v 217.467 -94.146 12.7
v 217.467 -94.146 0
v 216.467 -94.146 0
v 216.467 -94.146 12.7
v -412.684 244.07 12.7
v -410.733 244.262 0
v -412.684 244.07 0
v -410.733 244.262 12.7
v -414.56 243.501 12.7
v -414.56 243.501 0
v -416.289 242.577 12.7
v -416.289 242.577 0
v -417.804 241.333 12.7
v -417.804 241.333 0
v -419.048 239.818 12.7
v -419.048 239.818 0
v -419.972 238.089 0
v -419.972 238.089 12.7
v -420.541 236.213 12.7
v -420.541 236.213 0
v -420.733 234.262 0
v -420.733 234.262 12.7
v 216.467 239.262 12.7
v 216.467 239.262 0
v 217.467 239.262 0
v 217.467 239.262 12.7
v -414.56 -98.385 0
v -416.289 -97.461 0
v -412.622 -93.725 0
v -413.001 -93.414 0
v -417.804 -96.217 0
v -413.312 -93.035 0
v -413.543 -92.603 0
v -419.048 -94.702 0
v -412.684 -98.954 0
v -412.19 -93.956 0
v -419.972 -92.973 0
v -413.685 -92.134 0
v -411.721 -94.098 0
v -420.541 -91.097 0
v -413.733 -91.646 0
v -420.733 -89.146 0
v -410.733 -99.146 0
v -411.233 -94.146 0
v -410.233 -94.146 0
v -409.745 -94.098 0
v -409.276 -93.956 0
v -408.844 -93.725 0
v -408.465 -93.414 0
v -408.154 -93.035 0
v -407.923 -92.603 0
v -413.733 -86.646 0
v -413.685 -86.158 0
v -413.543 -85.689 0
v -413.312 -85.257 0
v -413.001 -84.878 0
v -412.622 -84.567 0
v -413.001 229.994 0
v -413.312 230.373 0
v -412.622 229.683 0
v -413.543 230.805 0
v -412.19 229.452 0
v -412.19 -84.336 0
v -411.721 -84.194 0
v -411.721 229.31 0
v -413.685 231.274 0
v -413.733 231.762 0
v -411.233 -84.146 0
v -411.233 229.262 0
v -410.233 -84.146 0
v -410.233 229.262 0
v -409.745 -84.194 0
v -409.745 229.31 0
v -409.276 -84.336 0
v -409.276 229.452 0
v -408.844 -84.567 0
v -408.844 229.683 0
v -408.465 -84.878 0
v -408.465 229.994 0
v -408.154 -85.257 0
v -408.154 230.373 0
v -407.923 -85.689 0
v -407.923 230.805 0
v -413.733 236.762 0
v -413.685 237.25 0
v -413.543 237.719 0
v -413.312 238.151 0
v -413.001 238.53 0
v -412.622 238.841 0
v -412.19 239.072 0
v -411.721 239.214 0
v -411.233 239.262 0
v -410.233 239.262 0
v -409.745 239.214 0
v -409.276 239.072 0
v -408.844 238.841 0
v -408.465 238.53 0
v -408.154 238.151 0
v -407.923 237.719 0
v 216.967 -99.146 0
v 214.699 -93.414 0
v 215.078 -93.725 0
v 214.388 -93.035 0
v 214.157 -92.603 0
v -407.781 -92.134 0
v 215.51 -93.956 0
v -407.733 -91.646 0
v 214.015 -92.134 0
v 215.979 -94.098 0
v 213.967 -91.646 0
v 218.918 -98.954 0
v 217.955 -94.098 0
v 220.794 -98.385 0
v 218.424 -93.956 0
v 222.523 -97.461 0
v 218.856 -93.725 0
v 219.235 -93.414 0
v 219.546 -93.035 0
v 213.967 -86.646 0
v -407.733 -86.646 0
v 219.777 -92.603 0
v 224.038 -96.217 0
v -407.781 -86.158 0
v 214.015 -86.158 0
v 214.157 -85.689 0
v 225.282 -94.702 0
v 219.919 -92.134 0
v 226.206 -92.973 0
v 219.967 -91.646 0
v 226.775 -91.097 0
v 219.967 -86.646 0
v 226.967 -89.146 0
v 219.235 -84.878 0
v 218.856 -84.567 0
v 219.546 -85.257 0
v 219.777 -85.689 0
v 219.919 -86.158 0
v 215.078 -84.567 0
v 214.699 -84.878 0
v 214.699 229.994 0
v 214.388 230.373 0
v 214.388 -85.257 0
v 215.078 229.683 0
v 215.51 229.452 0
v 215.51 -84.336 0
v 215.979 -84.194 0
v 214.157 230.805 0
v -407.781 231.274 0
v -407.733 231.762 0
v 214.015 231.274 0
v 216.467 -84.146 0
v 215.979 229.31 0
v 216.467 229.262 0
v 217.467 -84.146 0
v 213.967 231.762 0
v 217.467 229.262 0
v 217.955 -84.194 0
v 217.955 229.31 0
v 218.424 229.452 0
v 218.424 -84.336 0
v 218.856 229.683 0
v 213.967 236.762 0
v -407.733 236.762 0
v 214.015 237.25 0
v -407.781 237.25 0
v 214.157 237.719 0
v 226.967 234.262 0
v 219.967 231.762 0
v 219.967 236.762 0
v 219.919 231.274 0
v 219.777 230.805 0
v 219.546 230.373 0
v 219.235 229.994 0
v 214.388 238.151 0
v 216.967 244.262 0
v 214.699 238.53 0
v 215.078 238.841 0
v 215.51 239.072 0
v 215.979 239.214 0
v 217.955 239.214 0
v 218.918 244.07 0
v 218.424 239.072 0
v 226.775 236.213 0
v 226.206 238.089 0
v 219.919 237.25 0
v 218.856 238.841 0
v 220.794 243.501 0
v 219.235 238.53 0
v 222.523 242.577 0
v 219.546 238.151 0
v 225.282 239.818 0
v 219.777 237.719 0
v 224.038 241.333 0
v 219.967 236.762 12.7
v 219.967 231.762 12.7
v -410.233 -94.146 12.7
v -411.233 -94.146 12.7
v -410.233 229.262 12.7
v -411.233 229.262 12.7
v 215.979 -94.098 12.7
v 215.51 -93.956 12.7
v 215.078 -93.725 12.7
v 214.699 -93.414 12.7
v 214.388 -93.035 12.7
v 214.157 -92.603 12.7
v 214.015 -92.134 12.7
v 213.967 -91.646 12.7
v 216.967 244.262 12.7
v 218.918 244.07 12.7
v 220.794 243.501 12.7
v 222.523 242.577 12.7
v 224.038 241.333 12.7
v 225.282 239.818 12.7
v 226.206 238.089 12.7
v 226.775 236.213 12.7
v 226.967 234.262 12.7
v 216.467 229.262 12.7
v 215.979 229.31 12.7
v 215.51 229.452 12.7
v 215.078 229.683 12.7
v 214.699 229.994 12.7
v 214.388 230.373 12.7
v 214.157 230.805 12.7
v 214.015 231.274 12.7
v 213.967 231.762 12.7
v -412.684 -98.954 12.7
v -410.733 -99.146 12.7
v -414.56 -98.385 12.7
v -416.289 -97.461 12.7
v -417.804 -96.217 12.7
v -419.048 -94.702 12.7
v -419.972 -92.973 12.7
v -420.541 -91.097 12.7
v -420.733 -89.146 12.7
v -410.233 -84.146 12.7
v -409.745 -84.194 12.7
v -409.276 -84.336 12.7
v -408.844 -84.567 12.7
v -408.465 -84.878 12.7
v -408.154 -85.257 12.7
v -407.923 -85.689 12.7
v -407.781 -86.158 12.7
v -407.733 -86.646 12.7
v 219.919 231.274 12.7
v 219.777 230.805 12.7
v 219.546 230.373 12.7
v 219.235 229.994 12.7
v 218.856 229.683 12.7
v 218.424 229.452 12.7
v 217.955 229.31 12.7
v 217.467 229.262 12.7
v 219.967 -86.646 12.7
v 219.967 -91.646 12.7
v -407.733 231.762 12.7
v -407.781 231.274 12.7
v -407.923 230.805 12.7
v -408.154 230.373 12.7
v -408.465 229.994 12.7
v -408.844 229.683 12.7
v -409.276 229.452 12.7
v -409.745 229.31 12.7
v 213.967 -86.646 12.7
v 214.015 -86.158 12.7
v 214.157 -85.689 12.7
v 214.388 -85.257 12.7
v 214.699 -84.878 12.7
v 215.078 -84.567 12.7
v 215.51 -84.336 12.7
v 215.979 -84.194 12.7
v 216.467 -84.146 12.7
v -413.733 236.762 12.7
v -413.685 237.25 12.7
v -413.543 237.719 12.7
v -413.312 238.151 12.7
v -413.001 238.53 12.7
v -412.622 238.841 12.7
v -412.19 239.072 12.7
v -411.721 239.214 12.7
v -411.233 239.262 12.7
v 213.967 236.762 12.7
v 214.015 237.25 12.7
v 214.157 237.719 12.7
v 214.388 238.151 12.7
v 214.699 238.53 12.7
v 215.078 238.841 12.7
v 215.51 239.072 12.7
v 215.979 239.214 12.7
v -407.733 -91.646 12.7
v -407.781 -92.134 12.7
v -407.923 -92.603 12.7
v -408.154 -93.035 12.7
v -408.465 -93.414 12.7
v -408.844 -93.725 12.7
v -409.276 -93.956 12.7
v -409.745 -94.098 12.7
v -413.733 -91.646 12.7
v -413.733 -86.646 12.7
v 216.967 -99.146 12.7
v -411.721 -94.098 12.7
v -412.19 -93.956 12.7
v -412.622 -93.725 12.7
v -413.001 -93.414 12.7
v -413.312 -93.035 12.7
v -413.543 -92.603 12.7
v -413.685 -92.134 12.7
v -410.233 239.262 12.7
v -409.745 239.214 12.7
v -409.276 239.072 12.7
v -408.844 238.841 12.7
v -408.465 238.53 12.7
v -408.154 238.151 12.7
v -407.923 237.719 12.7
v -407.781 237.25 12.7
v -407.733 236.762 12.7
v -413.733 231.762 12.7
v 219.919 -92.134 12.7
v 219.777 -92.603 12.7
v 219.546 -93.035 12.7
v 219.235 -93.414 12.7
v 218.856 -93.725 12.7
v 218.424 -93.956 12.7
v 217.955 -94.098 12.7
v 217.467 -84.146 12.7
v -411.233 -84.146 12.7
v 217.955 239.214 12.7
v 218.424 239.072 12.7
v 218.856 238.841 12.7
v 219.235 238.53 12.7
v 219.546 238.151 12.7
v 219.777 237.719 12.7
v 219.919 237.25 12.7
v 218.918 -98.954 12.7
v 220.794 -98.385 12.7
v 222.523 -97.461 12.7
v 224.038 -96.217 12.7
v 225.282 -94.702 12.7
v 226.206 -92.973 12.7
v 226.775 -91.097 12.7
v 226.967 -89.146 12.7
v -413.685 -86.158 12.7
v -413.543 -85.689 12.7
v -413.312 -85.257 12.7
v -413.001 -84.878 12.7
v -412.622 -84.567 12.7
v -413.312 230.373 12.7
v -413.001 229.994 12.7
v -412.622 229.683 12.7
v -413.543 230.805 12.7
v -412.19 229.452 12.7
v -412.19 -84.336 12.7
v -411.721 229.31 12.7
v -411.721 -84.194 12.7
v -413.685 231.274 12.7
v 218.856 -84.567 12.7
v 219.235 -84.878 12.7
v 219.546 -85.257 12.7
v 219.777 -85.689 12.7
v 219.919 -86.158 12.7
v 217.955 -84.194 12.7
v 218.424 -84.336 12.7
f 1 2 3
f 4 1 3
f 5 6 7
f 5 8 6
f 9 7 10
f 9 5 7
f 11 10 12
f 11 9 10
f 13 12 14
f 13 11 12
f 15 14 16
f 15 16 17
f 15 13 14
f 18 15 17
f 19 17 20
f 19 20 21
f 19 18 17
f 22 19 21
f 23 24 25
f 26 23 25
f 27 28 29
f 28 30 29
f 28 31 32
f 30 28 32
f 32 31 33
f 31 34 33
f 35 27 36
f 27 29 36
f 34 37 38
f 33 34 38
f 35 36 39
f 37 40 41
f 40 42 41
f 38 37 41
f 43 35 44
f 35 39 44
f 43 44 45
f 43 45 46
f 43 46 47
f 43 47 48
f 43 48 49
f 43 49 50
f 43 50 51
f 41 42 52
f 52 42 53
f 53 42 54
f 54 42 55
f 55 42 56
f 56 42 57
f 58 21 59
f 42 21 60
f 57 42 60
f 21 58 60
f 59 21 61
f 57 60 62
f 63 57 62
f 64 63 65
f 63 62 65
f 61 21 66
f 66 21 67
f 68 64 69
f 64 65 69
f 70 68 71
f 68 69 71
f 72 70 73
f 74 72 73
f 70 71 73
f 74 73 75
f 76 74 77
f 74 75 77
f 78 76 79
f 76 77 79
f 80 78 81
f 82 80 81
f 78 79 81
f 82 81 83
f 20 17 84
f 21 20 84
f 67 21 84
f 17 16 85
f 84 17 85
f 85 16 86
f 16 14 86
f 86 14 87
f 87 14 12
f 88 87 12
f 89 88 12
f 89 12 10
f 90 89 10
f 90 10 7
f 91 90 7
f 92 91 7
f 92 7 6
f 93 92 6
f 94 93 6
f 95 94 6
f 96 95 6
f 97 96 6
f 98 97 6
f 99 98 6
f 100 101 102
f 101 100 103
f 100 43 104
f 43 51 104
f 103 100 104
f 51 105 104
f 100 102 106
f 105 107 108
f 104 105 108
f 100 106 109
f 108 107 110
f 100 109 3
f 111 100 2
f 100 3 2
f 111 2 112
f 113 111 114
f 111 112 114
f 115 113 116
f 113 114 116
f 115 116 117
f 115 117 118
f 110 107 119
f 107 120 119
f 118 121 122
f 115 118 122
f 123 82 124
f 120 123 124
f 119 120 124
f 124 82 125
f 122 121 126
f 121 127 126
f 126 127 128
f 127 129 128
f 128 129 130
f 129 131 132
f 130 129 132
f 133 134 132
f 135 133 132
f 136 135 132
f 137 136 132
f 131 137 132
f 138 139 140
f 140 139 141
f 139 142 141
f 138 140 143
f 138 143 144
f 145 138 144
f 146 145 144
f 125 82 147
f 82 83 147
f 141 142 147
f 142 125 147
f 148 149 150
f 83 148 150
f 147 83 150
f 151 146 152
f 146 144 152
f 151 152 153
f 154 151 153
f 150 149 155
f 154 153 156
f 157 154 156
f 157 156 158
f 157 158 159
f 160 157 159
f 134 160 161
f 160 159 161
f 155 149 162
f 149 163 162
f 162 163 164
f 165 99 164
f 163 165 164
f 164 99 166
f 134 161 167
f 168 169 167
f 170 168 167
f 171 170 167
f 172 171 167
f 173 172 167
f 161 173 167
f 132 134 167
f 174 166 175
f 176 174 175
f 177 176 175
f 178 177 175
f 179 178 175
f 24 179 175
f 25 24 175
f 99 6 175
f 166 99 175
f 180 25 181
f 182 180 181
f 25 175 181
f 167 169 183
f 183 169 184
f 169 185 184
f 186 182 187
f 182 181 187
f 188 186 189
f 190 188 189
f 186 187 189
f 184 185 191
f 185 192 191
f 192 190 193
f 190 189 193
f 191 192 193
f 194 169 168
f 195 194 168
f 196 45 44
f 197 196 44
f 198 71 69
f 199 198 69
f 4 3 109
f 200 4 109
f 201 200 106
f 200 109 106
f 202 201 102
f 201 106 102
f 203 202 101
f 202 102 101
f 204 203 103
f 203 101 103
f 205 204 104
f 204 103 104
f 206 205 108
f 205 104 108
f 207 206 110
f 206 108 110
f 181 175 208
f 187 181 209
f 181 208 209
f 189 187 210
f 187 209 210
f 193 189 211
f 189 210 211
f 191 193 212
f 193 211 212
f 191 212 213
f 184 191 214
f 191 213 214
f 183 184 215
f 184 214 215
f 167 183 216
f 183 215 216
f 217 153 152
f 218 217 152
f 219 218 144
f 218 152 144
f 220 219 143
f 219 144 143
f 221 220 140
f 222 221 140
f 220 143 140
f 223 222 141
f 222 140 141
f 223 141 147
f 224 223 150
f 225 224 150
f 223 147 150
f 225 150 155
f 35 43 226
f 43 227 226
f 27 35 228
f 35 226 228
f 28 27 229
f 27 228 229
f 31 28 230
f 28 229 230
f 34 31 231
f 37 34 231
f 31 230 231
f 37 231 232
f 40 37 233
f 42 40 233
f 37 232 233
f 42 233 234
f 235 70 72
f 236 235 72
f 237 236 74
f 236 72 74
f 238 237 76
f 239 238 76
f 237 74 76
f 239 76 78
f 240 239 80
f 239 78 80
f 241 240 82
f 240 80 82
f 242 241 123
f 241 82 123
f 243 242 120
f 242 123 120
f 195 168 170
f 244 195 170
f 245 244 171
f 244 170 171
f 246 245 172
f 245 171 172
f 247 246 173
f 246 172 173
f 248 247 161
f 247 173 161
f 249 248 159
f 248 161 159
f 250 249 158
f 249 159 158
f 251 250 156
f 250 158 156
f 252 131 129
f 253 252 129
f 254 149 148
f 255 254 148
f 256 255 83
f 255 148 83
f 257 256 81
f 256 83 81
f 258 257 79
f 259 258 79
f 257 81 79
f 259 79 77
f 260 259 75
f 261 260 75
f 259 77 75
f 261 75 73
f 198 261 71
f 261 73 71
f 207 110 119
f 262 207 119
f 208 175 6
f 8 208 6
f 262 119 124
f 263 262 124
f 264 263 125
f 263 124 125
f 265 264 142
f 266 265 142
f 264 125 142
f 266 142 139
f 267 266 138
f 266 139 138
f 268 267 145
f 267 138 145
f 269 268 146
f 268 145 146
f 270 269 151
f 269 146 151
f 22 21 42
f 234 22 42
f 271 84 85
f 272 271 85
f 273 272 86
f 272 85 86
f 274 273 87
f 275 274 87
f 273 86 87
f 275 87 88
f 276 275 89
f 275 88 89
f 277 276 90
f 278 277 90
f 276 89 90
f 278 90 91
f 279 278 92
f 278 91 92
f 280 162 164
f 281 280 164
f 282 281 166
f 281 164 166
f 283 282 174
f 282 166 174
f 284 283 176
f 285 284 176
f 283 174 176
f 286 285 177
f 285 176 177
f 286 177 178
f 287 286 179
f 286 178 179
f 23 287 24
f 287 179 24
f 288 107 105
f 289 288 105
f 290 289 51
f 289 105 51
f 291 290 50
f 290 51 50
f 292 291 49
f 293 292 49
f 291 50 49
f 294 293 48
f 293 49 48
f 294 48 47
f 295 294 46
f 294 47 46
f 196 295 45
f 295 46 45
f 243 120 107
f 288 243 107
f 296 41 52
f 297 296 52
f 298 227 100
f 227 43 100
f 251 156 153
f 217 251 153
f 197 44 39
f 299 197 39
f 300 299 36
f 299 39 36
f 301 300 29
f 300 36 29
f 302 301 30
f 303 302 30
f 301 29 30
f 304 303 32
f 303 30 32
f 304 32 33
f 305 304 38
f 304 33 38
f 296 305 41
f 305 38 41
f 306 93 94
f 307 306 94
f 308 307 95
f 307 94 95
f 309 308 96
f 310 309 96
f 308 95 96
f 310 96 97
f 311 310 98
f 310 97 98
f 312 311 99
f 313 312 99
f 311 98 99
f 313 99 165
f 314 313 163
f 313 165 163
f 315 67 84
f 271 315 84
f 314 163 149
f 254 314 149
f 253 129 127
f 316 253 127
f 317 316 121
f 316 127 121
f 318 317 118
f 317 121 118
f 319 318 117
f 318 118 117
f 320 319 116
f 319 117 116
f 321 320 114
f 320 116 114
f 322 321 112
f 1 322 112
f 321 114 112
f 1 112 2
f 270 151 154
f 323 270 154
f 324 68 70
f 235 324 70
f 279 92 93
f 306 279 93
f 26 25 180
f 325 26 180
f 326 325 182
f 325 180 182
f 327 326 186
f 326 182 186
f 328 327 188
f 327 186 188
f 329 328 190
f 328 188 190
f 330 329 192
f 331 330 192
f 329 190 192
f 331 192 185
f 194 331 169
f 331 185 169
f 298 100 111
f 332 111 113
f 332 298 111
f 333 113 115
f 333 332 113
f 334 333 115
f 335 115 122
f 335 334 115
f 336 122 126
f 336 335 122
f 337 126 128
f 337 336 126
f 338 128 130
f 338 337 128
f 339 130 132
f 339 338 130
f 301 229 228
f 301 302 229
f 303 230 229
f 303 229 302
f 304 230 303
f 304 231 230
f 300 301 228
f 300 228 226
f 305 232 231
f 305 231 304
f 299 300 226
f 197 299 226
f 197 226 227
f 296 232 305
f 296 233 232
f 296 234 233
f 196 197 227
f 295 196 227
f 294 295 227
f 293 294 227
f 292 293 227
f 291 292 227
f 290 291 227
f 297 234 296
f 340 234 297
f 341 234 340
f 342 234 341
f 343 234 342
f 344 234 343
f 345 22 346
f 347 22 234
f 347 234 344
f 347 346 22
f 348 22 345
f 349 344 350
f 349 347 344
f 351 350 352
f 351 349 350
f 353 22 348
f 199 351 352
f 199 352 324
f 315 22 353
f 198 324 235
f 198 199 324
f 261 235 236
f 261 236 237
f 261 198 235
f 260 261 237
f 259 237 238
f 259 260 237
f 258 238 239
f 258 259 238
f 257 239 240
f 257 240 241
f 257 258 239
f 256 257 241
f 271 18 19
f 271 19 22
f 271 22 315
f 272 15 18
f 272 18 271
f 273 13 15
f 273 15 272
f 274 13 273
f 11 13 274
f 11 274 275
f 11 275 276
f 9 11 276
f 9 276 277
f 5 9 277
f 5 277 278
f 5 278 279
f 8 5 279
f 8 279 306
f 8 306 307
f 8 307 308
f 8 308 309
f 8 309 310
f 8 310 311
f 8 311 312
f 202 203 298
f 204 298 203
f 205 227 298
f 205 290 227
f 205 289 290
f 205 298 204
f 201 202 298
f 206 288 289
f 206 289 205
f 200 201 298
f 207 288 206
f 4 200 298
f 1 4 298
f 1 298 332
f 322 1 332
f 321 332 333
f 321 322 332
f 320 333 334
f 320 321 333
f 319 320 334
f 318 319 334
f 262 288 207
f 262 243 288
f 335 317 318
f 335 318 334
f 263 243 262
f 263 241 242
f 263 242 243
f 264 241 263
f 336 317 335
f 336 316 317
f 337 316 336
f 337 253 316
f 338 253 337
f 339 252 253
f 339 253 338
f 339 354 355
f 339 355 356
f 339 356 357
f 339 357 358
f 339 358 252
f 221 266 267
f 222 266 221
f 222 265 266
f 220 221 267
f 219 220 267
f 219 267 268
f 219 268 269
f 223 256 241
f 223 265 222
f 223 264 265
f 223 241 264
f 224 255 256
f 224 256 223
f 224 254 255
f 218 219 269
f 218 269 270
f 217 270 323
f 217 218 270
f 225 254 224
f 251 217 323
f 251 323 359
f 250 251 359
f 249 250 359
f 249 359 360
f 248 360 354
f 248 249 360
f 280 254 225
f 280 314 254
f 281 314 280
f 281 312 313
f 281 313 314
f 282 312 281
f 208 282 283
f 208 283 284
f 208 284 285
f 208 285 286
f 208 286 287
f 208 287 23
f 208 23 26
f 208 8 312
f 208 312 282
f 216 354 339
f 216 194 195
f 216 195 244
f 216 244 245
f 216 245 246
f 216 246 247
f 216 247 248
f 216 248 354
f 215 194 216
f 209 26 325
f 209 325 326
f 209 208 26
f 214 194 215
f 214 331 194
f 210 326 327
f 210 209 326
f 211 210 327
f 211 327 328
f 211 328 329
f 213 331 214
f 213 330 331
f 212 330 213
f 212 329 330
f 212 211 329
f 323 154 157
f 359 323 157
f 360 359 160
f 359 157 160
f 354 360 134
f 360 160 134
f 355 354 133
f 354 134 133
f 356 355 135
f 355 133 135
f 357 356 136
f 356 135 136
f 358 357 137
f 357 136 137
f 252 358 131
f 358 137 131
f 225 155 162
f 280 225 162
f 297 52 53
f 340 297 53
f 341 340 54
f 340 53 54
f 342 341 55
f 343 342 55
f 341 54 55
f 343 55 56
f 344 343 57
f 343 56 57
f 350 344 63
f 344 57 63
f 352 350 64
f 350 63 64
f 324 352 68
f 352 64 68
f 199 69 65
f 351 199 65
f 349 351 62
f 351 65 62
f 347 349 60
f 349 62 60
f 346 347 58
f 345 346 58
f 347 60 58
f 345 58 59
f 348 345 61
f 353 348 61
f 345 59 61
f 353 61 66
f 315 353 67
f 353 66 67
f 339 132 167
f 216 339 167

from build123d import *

# Parameters (mm, degrees)
BOSS_EXTRUDE3_DEPTH = 12.7
FILLET1_R           = 10


with BuildPart() as part:
    # Sketch1 → Boss-Extrude3 (new body)
    # profile 1 of 2: a face of its own
    with BuildSketch(Plane.XY):
        with BuildLine():
            Line((226.967032535, 244.261961814), (-410.732967465, 244.261961814))
            Line((-410.732967465, 244.261961814), (-410.732967465, 239.261961814))
            Line((-410.732967465, 239.261961814), (-410.232967465, 239.261961814))
            ThreePointArc((-410.232967465, 239.261961814), (-408.465200512, 238.529728767), (-407.732967465, 236.761961814))
            Line((-407.732967465, 236.761961814), (-407.732967465, 231.761961814))
            ThreePointArc((-407.732967465, 231.761961814), (-408.465200512, 229.994194861), (-410.232967465, 229.261961814))
            Line((-410.232967465, 229.261961814), (-410.732967465, 229.261961814))
            Line((-410.732967465, 229.261961814), (-410.732967465, -84.146038186))
            Line((-410.732967465, -84.146038186), (-410.232967465, -84.146038186))
            ThreePointArc((-410.232967465, -84.146038186), (-408.465200512, -84.878271233), (-407.732967465, -86.646038186))
            Line((-407.732967465, -86.646038186), (-407.732967465, -91.646038186))
            ThreePointArc((-407.732967465, -91.646038186), (-408.465200512, -93.413805139), (-410.232967465, -94.146038186))
            Line((-410.232967465, -94.146038186), (-410.732967465, -94.146038186))
            Line((-410.732967465, -94.146038186), (-410.732967465, -99.146038186))
            Line((-410.732967465, -99.146038186), (226.967032535, -99.146038186))
            Line((226.967032535, -99.146038186), (226.967032535, 244.261961814))
        make_face()
        with BuildLine():
            ThreePointArc((219.967032535, -91.646038186), (219.234799488, -93.413805139), (217.467032535, -94.146038186))
            Line((217.467032535, -94.146038186), (216.467032535, -94.146038186))
            ThreePointArc((216.467032535, -94.146038186), (214.699265582, -93.413805139), (213.967032535, -91.646038186))
            Line((213.967032535, -91.646038186), (213.967032535, -86.646038186))
            ThreePointArc((213.967032535, -86.646038186), (214.699265582, -84.878271233), (216.467032535, -84.146038186))
            Line((216.467032535, -84.146038186), (217.467032535, -84.146038186))
            ThreePointArc((217.467032535, -84.146038186), (219.234799488, -84.878271233), (219.967032535, -86.646038186))
            Line((219.967032535, -86.646038186), (219.967032535, -91.646038186))
        make_face(mode=Mode.SUBTRACT)
        with BuildLine():
            ThreePointArc((219.967032535, 231.761961814), (219.234799488, 229.994194861), (217.467032535, 229.261961814))
            Line((217.467032535, 229.261961814), (216.467032535, 229.261961814))
            ThreePointArc((216.467032535, 229.261961814), (214.699265582, 229.994194861), (213.967032535, 231.761961814))
            Line((213.967032535, 231.761961814), (213.967032535, 236.761961814))
            ThreePointArc((213.967032535, 236.761961814), (214.699265582, 238.529728767), (216.467032535, 239.261961814))
            Line((216.467032535, 239.261961814), (217.467032535, 239.261961814))
            ThreePointArc((217.467032535, 239.261961814), (219.234799488, 238.529728767), (219.967032535, 236.761961814))
            Line((219.967032535, 236.761961814), (219.967032535, 231.761961814))
        make_face(mode=Mode.SUBTRACT)
    # profile 2 of 2: a face of its own
    with BuildSketch(Plane.XY):
        with BuildLine():
            Line((-410.732967465, 244.261961814), (-420.732967465, 244.261961814))
            Line((-420.732967465, 244.261961814), (-420.732967465, -99.146038186))
            Line((-420.732967465, -99.146038186), (-410.732967465, -99.146038186))
            Line((-410.732967465, -99.146038186), (-410.732967465, -94.146038186))
            Line((-410.732967465, -94.146038186), (-411.232967465, -94.146038186))
            ThreePointArc((-411.232967465, -94.146038186), (-413.000734418, -93.413805139), (-413.732967465, -91.646038186))
            Line((-413.732967465, -91.646038186), (-413.732967465, -86.646038186))
            ThreePointArc((-413.732967465, -86.646038186), (-413.000734418, -84.878271233), (-411.232967465, -84.146038186))
            Line((-411.232967465, -84.146038186), (-410.732967465, -84.146038186))
            Line((-410.732967465, -84.146038186), (-410.732967465, 229.261961814))
            Line((-410.732967465, 229.261961814), (-411.232967465, 229.261961814))
            ThreePointArc((-411.232967465, 229.261961814), (-413.000734418, 229.994194861), (-413.732967465, 231.761961814))
            Line((-413.732967465, 231.761961814), (-413.732967465, 236.761961814))
            ThreePointArc((-413.732967465, 236.761961814), (-413.000734418, 238.529728767), (-411.232967465, 239.261961814))
            Line((-411.232967465, 239.261961814), (-410.732967465, 239.261961814))
            Line((-410.732967465, 239.261961814), (-410.732967465, 244.261961814))
        make_face()
    extrude(amount=BOSS_EXTRUDE3_DEPTH)

    # Fillet1
    fillet1_edges = [part.edges().sort_by_distance(p)[0] for p in [
        (-420.732967465, 244.261961814, 6.35),
        (226.967032535, 244.261961814, 6.35),
        (226.967032535, -99.146038186, 6.35),
        (-420.732967465, -99.146038186, 6.35),
    ]]
    fillet(fillet1_edges, radius=FILLET1_R)


solid = part.part
